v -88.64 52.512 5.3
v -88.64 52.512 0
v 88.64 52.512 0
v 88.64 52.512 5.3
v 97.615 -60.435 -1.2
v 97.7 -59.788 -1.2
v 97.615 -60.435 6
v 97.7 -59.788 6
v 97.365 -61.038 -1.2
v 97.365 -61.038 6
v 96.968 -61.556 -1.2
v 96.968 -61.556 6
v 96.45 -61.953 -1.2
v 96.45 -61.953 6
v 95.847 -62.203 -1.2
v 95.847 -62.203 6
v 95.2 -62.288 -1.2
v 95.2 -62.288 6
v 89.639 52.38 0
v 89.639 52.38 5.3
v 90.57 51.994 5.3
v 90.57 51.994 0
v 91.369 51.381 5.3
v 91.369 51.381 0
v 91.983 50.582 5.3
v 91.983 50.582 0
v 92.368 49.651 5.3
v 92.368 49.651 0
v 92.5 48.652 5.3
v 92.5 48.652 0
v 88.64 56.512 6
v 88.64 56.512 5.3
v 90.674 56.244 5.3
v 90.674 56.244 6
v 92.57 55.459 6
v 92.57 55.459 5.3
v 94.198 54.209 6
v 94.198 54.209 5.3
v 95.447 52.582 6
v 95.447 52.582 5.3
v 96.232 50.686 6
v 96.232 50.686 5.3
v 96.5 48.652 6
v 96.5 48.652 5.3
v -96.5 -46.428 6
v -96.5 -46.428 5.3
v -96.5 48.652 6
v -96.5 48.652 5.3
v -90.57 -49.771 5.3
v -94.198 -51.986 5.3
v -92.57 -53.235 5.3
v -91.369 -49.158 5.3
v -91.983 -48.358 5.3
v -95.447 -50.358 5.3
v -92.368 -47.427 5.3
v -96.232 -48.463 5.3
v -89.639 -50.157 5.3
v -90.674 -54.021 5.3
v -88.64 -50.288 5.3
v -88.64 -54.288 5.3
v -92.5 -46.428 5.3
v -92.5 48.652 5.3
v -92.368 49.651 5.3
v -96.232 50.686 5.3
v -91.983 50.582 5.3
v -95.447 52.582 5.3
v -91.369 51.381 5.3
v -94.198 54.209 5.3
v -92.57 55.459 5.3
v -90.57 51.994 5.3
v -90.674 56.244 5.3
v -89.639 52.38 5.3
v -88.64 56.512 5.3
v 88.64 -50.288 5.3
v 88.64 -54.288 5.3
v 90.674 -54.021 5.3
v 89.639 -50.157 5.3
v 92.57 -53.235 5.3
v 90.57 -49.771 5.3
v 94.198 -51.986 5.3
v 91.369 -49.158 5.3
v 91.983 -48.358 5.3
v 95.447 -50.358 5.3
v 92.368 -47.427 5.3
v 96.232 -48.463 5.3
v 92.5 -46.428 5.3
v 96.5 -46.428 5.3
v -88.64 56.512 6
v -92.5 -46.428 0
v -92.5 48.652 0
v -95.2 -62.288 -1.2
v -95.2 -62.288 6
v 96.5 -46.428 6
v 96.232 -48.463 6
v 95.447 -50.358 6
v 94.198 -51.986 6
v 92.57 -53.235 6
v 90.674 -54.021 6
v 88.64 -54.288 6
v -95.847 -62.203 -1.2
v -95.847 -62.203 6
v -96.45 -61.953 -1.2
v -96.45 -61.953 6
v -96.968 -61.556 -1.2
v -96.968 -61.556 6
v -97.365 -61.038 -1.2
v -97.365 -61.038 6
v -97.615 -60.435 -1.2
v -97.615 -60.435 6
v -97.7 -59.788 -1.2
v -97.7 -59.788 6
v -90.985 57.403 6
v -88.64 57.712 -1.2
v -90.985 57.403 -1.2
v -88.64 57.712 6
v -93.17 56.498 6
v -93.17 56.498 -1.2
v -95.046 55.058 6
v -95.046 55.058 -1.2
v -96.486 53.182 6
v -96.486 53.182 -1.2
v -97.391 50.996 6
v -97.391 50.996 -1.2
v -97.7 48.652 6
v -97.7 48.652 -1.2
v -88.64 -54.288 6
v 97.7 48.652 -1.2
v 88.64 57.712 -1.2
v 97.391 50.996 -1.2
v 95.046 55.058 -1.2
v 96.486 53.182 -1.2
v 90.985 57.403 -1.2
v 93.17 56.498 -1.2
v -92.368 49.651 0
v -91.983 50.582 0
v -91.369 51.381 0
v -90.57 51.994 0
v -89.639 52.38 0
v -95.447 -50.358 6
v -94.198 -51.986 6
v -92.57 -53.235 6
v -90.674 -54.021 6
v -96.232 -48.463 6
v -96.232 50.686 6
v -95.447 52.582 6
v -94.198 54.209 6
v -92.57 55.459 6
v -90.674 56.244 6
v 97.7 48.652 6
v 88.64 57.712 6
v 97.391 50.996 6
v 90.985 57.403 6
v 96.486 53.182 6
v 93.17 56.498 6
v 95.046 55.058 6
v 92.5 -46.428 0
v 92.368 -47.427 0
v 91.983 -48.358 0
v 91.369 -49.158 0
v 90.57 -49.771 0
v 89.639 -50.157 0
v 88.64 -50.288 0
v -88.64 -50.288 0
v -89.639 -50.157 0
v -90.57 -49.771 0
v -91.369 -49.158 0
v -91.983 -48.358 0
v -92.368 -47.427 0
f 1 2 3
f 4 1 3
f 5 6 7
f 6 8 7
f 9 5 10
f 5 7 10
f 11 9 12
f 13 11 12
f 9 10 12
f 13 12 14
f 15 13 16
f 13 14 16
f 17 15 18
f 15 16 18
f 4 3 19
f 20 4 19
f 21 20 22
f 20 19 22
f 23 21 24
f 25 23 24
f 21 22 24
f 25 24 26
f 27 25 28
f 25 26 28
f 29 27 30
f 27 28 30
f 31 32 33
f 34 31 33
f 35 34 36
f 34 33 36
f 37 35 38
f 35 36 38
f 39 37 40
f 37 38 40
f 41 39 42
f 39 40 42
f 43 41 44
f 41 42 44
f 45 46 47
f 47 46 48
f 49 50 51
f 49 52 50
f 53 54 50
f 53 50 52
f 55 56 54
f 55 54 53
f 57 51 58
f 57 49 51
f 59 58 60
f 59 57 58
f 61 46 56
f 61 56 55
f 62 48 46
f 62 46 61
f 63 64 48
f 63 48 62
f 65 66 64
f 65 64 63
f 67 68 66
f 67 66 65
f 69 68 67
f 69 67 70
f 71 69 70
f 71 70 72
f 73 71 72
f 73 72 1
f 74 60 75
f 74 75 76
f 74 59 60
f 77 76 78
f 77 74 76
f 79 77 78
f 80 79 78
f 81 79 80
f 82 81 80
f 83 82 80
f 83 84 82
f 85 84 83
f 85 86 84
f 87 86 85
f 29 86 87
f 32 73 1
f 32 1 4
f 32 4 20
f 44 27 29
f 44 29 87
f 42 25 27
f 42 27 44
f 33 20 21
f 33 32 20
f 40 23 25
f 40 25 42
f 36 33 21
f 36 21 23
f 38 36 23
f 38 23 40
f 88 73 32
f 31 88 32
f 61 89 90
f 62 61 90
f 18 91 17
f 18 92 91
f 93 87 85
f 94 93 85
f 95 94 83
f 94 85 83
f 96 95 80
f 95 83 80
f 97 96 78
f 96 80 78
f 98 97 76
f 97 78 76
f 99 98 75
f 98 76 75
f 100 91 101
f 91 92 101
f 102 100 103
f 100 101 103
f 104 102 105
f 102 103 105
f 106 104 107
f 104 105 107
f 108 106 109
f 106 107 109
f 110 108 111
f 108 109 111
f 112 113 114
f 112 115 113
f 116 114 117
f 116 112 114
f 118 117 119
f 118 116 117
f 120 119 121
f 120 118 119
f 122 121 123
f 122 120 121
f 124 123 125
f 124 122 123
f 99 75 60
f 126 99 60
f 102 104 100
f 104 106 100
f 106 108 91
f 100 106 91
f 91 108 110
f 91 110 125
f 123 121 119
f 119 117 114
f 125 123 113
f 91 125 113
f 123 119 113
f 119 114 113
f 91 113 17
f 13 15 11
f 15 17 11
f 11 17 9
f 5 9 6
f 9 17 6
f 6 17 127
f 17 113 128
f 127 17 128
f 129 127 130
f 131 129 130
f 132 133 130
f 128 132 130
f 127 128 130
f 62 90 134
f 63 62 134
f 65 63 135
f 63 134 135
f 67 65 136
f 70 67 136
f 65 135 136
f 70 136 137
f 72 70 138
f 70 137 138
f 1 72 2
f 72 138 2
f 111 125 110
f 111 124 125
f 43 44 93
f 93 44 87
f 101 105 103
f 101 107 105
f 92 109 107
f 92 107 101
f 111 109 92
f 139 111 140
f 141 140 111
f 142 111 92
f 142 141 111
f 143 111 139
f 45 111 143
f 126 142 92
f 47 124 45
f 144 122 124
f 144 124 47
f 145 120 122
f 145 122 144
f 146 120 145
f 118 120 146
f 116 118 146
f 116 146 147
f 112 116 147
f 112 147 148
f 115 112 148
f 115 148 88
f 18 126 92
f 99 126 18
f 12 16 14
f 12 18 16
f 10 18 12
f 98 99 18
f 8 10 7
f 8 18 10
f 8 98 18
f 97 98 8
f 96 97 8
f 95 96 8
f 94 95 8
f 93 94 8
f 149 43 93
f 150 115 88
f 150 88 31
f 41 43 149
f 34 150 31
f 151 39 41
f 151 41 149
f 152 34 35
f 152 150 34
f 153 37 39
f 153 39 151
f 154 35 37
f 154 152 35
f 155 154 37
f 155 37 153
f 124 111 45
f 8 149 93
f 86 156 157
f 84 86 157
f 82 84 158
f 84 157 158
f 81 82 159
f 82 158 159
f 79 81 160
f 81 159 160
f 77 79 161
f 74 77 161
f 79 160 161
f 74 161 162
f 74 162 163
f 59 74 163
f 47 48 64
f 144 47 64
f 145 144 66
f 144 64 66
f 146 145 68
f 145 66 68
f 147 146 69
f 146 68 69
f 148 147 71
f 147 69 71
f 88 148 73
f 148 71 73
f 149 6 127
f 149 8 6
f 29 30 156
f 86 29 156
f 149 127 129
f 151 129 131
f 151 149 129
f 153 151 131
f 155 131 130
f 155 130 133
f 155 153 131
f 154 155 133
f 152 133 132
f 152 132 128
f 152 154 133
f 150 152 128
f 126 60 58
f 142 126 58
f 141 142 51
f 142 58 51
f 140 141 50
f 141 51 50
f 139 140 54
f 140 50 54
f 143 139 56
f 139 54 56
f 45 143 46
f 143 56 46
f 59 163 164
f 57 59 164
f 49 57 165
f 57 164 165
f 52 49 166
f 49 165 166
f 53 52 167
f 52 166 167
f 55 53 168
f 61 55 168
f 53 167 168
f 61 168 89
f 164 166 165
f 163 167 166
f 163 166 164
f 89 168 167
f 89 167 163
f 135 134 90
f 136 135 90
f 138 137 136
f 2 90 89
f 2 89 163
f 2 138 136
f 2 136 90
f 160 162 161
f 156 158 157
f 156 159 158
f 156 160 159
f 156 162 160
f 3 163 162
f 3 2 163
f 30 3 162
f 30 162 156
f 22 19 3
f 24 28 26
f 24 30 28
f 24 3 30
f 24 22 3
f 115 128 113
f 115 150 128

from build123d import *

# Parameters (mm, degrees)
F1_DEPTH = 5.3
F2_DEPTH = 6
F3_DEPTH = 1.2
F4_R     = 2.5


with BuildPart() as f1:
    # F0 (on Top) → F1 (new body)
    with BuildSketch(Plane.XY):
        with BuildLine():
            Line((88.64, 56.511587), (-88.64, 56.511587))
            ThreePointArc((-88.64, 56.511587), (-94.197859, 54.209447), (-96.5, 48.651587))
            Line((-96.5, 48.651587), (-96.5, -46.428413))
            ThreePointArc((-96.5, -46.428413), (-94.197859, -51.986272), (-88.64, -54.288413))
            Line((-88.64, -54.288413), (88.64, -54.288413))
            ThreePointArc((88.64, -54.288413), (94.197859, -51.986272), (96.5, -46.428413))
            Line((96.5, -46.428413), (96.5, 48.651587))
            ThreePointArc((96.5, 48.651587), (94.197859, 54.209447), (88.64, 56.511587))
        make_face()
        with BuildLine():
            ThreePointArc((-92.5, 48.651587), (-91.369432, 51.38102), (-88.64, 52.511587))
            Line((-88.64, 52.511587), (88.64, 52.511587))
            ThreePointArc((88.64, 52.511587), (91.369432, 51.38102), (92.5, 48.651587))
            Line((92.5, 48.651587), (92.5, -46.428413))
            ThreePointArc((92.5, -46.428413), (91.369432, -49.157845), (88.64, -50.288413))
            Line((88.64, -50.288413), (-88.64, -50.288413))
            ThreePointArc((-88.64, -50.288413), (-91.369432, -49.157845), (-92.5, -46.428413))
            Line((-92.5, -46.428413), (-92.5, 48.651587))
        make_face(mode=Mode.SUBTRACT)
    extrude(amount=F1_DEPTH)

    # F0 (on Top) → F2 (join)
    with BuildSketch(Plane.XY):
        with BuildLine():
            ThreePointArc((-88.64, 57.711587), (-95.046387, 55.057975), (-97.7, 48.651587))
            Line((-97.7, 48.651587), (-97.7, -46.428413))
            Line((-97.7, -46.428413), (-97.7, -62.288413))
            Line((-97.7, -62.288413), (97.7, -62.288413))
            Line((97.7, -62.288413), (97.7, -46.428413))
            Line((97.7, -46.428413), (97.7, 48.651587))
            ThreePointArc((97.7, 48.651587), (95.046387, 55.057975), (88.64, 57.711587))
            Line((88.64, 57.711587), (-88.64, 57.711587))
        make_face()
        with BuildLine():
            ThreePointArc((-96.5, 48.651587), (-94.197859, 54.209447), (-88.64, 56.511587))
            Line((-88.64, 56.511587), (88.64, 56.511587))
            ThreePointArc((88.64, 56.511587), (94.197859, 54.209447), (96.5, 48.651587))
            Line((96.5, 48.651587), (96.5, -46.428413))
            ThreePointArc((96.5, -46.428413), (94.197859, -51.986272), (88.64, -54.288413))
            Line((88.64, -54.288413), (-88.64, -54.288413))
            ThreePointArc((-88.64, -54.288413), (-94.197859, -51.986272), (-96.5, -46.428413))
            Line((-96.5, -46.428413), (-96.5, 48.651587))
        make_face(mode=Mode.SUBTRACT)
    extrude(amount=F2_DEPTH)

    # F0 (on Top) → F3 (join)
    with BuildSketch(Plane.XY):
        with BuildLine():
            ThreePointArc((-88.64, 57.711587), (-95.046387, 55.057975), (-97.7, 48.651587))
            Line((-97.7, 48.651587), (-97.7, -46.428413))
            Line((-97.7, -46.428413), (-97.7, -62.288413))
            Line((-97.7, -62.288413), (97.7, -62.288413))
            Line((97.7, -62.288413), (97.7, -46.428413))
            Line((97.7, -46.428413), (97.7, 48.651587))
            ThreePointArc((97.7, 48.651587), (95.046387, 55.057975), (88.64, 57.711587))
            Line((88.64, 57.711587), (-88.64, 57.711587))
        make_face()
        with BuildLine():
            ThreePointArc((-96.5, 48.651587), (-94.197859, 54.209447), (-88.64, 56.511587))
            Line((-88.64, 56.511587), (88.64, 56.511587))
            ThreePointArc((88.64, 56.511587), (94.197859, 54.209447), (96.5, 48.651587))
            Line((96.5, 48.651587), (96.5, -46.428413))
            ThreePointArc((96.5, -46.428413), (94.197859, -51.986272), (88.64, -54.288413))
            Line((88.64, -54.288413), (-88.64, -54.288413))
            ThreePointArc((-88.64, -54.288413), (-94.197859, -51.986272), (-96.5, -46.428413))
            Line((-96.5, -46.428413), (-96.5, 48.651587))
        make_face(mode=Mode.SUBTRACT)
        with BuildLine():
            Line((88.64, 56.511587), (-88.64, 56.511587))
            ThreePointArc((-88.64, 56.511587), (-94.197859, 54.209447), (-96.5, 48.651587))
            Line((-96.5, 48.651587), (-96.5, -46.428413))
            ThreePointArc((-96.5, -46.428413), (-94.197859, -51.986272), (-88.64, -54.288413))
            Line((-88.64, -54.288413), (88.64, -54.288413))
            ThreePointArc((88.64, -54.288413), (94.197859, -51.986272), (96.5, -46.428413))
            Line((96.5, -46.428413), (96.5, 48.651587))
            ThreePointArc((96.5, 48.651587), (94.197859, 54.209447), (88.64, 56.511587))
        make_face()
        with BuildLine():
            ThreePointArc((-92.5, 48.651587), (-91.369432, 51.38102), (-88.64, 52.511587))
            Line((-88.64, 52.511587), (88.64, 52.511587))
            ThreePointArc((88.64, 52.511587), (91.369432, 51.38102), (92.5, 48.651587))
            Line((92.5, 48.651587), (92.5, -46.428413))
            ThreePointArc((92.5, -46.428413), (91.369432, -49.157845), (88.64, -50.288413))
            Line((88.64, -50.288413), (-88.64, -50.288413))
            ThreePointArc((-88.64, -50.288413), (-91.369432, -49.157845), (-92.5, -46.428413))
            Line((-92.5, -46.428413), (-92.5, 48.651587))
        make_face(mode=Mode.SUBTRACT)
        with BuildLine():
            Line((88.64, 52.511587), (-88.64, 52.511587))
            ThreePointArc((-88.64, 52.511587), (-91.369432, 51.38102), (-92.5, 48.651587))
            Line((-92.5, 48.651587), (-92.5, -46.428413))
            ThreePointArc((-92.5, -46.428413), (-91.369432, -49.157845), (-88.64, -50.288413))
            Line((-88.64, -50.288413), (88.64, -50.288413))
            ThreePointArc((88.64, -50.288413), (91.369432, -49.157845), (92.5, -46.428413))
            Line((92.5, -46.428413), (92.5, 48.651587))
            ThreePointArc((92.5, 48.651587), (91.369432, 51.38102), (88.64, 52.511587))
        make_face()
    extrude(amount=-F3_DEPTH)

    # F4
    f4_edges = [f1.edges().sort_by_distance(p)[0] for p in [
        (97.7, -62.288413, 2.4),
        (-97.7, -62.288413, 2.4),
    ]]
    fillet(f4_edges, radius=F4_R)


solid = f1.part
